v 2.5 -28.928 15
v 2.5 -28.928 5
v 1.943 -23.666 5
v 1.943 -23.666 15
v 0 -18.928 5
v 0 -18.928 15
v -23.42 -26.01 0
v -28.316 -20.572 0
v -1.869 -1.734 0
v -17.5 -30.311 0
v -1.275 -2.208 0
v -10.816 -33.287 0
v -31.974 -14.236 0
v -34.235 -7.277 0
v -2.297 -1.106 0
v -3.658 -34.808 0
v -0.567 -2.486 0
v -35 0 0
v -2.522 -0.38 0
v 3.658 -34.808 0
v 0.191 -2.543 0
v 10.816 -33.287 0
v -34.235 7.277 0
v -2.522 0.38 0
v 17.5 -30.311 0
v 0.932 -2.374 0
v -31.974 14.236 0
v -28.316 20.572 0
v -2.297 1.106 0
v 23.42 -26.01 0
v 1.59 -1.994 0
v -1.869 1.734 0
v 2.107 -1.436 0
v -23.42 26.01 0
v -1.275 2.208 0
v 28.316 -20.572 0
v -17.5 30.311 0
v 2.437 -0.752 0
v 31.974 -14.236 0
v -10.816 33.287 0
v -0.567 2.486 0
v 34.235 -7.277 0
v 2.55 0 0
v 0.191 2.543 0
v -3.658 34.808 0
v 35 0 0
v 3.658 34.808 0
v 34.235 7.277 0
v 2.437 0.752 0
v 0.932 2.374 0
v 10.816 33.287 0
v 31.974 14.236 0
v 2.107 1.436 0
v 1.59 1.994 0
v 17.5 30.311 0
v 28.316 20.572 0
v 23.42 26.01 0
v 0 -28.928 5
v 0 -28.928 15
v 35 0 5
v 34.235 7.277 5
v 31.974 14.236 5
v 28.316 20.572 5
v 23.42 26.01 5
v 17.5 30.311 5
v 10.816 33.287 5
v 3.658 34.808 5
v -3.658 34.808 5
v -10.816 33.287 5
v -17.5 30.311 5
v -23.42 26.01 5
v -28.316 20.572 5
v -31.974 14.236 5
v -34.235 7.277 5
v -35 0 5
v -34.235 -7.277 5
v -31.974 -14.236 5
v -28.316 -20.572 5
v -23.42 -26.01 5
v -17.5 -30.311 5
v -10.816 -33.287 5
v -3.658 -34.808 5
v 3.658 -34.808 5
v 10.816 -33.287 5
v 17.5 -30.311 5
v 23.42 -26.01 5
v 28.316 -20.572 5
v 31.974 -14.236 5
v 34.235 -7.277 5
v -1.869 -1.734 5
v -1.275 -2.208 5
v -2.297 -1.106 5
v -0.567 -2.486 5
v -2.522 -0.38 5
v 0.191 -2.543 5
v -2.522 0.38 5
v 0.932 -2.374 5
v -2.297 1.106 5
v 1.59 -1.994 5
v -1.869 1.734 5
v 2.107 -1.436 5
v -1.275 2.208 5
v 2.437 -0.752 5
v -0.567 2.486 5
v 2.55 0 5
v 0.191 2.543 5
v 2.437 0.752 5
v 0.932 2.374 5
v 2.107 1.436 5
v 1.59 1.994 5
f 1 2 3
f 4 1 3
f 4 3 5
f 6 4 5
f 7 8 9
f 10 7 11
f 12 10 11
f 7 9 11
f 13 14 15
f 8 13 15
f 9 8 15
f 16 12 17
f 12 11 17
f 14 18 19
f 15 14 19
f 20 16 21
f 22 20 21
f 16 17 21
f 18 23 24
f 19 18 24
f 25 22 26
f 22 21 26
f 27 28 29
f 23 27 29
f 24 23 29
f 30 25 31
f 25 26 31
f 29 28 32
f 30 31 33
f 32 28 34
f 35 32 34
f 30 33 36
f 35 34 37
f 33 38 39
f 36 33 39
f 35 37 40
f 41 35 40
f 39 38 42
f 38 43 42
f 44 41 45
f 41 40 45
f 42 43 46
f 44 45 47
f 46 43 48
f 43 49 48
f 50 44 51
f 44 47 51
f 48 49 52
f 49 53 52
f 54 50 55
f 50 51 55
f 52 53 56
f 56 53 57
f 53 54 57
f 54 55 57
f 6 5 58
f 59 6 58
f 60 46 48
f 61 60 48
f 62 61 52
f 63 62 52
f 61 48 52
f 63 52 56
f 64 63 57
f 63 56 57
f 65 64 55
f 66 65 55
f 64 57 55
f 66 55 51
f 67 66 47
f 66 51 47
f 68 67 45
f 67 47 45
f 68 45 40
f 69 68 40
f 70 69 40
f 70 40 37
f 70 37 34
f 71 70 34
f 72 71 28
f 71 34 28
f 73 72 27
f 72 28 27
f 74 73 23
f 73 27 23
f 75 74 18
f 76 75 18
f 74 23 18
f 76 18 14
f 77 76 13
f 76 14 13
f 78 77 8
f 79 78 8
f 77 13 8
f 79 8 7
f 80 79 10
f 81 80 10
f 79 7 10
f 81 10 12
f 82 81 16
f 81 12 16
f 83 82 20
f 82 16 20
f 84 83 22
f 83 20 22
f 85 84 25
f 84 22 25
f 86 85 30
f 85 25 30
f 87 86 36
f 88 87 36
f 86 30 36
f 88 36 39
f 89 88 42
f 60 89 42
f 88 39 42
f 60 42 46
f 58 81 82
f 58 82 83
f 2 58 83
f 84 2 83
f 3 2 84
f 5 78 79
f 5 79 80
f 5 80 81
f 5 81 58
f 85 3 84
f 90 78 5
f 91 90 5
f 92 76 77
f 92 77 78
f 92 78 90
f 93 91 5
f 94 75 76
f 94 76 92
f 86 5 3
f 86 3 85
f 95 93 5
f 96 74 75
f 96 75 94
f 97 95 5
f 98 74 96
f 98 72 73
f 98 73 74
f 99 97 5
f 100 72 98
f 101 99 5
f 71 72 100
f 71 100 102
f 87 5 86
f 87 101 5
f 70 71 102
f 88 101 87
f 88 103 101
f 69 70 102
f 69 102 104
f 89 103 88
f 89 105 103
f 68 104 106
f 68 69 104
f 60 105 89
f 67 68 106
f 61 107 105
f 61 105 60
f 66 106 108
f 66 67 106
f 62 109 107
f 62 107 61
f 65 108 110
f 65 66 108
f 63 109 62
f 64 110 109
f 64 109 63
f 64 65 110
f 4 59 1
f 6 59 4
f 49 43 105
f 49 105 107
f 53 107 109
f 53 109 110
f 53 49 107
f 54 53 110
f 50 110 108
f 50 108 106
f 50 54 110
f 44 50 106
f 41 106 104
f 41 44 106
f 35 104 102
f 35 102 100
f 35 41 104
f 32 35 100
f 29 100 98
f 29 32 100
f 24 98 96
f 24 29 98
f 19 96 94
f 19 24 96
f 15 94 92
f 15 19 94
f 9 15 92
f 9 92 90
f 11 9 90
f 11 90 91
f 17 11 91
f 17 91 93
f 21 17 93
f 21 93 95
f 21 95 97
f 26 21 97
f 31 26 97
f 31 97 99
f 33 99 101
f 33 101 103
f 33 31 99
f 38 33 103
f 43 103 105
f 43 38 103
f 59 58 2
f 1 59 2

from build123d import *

# Parameters (mm, degrees)
F0_R     = 35
F0_R_2   = 2.55
F1_DEPTH = 5
F3_DEPTH = 10


with BuildPart() as f1:
    # F0 (on Top) → F1 (new body)
    with BuildSketch(Plane.XY):
        Circle(F0_R)
        Circle(F0_R_2, mode=Mode.SUBTRACT)
    extrude(amount=F1_DEPTH)

    # F2 (on face) → F3 (join)
    with BuildSketch(Plane.XY.offset(5)):
        Polygon((1.943101, -23.666137), (0, -18.927574), (0, -28.927574), (2.5, -28.927574), align=None)
    extrude(amount=F3_DEPTH)


solid = f1.part
